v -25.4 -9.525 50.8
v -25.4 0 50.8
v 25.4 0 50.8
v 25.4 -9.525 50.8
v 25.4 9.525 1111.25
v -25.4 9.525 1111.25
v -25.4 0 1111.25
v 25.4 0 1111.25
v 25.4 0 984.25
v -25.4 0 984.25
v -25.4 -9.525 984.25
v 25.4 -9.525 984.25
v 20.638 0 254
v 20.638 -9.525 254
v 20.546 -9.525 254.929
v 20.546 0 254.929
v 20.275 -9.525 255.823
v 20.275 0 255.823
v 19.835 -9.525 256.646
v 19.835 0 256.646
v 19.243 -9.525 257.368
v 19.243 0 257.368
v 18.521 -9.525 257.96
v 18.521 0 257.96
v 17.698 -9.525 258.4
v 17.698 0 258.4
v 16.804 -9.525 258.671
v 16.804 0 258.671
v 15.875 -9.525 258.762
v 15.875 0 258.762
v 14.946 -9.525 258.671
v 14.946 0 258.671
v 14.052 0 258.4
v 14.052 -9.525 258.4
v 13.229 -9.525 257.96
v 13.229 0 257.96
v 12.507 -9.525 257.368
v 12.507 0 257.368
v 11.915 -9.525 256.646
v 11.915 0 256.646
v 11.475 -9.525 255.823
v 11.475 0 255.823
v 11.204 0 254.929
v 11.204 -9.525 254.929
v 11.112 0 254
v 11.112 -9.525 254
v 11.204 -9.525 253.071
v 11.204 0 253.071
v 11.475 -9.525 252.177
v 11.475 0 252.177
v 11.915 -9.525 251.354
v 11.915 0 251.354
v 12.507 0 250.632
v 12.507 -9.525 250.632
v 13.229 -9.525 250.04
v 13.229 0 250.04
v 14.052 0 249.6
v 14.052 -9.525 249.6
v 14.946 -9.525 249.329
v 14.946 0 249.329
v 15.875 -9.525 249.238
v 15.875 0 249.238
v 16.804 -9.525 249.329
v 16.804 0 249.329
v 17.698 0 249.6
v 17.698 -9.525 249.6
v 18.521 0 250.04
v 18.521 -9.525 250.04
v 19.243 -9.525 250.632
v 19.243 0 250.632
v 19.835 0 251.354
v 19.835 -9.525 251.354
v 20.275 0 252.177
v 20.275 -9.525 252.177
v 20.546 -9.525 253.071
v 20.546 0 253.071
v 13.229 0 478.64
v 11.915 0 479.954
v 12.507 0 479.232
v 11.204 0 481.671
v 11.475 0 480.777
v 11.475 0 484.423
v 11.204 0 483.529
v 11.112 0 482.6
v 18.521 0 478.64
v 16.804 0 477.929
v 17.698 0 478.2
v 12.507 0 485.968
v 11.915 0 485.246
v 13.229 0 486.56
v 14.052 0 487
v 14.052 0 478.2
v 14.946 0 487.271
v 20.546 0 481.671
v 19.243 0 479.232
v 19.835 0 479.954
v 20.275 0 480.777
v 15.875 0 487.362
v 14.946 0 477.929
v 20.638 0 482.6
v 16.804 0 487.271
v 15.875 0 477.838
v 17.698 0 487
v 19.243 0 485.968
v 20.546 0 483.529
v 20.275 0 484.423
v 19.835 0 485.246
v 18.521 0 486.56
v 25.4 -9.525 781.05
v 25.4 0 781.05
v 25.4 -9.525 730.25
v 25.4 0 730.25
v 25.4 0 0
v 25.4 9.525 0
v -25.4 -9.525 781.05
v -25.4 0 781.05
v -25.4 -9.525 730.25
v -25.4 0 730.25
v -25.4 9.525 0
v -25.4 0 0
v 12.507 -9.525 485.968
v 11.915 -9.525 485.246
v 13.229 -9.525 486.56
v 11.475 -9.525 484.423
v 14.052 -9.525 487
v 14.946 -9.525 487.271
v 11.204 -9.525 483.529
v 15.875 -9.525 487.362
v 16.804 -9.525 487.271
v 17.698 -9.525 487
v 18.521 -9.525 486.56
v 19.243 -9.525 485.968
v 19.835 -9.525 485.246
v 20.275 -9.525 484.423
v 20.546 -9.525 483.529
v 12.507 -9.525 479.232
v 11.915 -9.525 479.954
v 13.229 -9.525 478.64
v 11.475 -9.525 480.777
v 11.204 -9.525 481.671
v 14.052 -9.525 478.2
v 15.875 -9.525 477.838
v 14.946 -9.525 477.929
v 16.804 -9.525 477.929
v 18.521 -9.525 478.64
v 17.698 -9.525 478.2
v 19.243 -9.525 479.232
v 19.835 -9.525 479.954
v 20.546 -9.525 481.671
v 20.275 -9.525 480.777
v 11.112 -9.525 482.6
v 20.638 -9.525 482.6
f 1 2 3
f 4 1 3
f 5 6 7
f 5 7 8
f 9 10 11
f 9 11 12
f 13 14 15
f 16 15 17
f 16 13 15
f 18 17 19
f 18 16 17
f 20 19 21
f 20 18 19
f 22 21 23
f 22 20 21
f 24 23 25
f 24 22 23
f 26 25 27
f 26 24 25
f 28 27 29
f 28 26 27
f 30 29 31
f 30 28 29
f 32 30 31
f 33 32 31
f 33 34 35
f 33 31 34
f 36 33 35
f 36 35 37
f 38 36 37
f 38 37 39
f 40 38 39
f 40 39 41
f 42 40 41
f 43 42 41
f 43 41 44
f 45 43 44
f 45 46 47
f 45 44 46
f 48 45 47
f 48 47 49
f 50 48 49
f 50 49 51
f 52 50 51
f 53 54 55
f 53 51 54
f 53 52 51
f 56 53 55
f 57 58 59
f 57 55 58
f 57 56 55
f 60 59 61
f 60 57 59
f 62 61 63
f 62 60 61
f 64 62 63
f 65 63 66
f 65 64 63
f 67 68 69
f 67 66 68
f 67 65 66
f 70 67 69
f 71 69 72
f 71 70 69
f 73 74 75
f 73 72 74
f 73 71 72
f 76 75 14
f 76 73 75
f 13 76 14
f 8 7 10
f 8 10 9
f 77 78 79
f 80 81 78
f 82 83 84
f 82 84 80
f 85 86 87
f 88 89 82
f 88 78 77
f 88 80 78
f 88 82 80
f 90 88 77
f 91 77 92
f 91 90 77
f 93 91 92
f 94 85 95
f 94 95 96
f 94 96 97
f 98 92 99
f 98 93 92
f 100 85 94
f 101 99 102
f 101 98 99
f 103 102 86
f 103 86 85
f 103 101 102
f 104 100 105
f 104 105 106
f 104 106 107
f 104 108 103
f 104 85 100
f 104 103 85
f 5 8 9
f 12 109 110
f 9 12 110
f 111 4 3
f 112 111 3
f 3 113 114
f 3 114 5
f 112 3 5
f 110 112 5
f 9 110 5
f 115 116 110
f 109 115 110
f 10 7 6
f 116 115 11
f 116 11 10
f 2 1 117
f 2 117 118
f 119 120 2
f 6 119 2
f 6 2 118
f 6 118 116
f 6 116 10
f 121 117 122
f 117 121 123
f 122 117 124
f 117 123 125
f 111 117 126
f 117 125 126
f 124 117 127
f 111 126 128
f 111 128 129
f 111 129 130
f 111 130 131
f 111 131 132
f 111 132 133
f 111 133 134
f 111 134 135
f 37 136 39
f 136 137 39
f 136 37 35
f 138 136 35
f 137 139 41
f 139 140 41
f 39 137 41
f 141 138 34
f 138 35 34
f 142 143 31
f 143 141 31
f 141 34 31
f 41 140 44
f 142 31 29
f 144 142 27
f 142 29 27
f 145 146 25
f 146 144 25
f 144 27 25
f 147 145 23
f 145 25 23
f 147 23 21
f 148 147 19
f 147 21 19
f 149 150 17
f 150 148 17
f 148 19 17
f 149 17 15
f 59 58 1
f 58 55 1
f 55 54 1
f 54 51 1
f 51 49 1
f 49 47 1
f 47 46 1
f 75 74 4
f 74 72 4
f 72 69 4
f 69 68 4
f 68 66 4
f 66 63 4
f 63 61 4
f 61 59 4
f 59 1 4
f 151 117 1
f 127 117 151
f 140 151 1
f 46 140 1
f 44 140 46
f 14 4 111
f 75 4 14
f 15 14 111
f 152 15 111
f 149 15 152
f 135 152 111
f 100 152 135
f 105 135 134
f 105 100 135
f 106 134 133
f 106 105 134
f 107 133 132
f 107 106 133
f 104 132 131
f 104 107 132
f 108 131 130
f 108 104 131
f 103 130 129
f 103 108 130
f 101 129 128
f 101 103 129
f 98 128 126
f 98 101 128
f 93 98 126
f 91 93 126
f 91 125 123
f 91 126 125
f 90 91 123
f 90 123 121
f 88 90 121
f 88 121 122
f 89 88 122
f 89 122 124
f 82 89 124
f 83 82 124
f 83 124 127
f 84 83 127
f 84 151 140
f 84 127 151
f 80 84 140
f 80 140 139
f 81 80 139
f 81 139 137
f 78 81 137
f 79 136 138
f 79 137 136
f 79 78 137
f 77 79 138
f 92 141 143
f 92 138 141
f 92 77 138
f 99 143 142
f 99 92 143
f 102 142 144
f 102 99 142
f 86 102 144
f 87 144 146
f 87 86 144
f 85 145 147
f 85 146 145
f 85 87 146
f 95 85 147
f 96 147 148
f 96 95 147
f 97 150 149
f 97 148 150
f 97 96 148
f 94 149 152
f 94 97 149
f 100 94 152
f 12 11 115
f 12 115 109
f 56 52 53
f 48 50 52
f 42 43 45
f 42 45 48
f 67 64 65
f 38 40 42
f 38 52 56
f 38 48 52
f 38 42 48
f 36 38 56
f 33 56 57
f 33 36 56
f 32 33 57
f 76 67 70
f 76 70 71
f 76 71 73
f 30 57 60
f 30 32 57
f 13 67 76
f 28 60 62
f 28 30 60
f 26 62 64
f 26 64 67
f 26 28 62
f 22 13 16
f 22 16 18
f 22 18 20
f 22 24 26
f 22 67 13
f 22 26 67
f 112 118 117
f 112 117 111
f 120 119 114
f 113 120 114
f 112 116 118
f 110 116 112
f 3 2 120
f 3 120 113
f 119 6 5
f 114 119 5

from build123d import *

# Parameters (mm, degrees)
F0_W     = 50.8
F0_H     = 19.05
F1_DEPTH = 1111.25
F2_W     = 122.435573
F2_H     = 50.8
F2_W_2   = 93.867282
F2_W_3   = 343.160421
F2_H_2   = 127
F3_DEPTH = 25.4
F4_R     = 4.7625
F5_DEPTH = 25.4


with BuildPart() as f1:
    # F0 (on Top) → F1 (new body)
    with BuildSketch(Plane.XY):
        Rectangle(F0_W, F0_H)
    extrude(amount=F1_DEPTH)

    # F2 (on Front) → F3 (cut)
    with BuildSketch(Plane.XZ):
        with Locations((22.446524, 25.4)):
            Rectangle(F2_W, F2_H)
        with Locations((2.720783, 755.65)):
            Rectangle(F2_W_2, F2_H)
        with Locations((-38.781822, 1047.75)):
            Rectangle(F2_W_3, F2_H_2)
    extrude(amount=F3_DEPTH, mode=Mode.SUBTRACT)

    # F4 (on Front) → F5 (cut)
    with BuildSketch(Plane.XZ):
        with Locations((15.875, 254)):
            Circle(F4_R)
        with Locations((15.875, 482.6)):
            Circle(F4_R)
    extrude(amount=F5_DEPTH, mode=Mode.SUBTRACT)


solid = f1.part
